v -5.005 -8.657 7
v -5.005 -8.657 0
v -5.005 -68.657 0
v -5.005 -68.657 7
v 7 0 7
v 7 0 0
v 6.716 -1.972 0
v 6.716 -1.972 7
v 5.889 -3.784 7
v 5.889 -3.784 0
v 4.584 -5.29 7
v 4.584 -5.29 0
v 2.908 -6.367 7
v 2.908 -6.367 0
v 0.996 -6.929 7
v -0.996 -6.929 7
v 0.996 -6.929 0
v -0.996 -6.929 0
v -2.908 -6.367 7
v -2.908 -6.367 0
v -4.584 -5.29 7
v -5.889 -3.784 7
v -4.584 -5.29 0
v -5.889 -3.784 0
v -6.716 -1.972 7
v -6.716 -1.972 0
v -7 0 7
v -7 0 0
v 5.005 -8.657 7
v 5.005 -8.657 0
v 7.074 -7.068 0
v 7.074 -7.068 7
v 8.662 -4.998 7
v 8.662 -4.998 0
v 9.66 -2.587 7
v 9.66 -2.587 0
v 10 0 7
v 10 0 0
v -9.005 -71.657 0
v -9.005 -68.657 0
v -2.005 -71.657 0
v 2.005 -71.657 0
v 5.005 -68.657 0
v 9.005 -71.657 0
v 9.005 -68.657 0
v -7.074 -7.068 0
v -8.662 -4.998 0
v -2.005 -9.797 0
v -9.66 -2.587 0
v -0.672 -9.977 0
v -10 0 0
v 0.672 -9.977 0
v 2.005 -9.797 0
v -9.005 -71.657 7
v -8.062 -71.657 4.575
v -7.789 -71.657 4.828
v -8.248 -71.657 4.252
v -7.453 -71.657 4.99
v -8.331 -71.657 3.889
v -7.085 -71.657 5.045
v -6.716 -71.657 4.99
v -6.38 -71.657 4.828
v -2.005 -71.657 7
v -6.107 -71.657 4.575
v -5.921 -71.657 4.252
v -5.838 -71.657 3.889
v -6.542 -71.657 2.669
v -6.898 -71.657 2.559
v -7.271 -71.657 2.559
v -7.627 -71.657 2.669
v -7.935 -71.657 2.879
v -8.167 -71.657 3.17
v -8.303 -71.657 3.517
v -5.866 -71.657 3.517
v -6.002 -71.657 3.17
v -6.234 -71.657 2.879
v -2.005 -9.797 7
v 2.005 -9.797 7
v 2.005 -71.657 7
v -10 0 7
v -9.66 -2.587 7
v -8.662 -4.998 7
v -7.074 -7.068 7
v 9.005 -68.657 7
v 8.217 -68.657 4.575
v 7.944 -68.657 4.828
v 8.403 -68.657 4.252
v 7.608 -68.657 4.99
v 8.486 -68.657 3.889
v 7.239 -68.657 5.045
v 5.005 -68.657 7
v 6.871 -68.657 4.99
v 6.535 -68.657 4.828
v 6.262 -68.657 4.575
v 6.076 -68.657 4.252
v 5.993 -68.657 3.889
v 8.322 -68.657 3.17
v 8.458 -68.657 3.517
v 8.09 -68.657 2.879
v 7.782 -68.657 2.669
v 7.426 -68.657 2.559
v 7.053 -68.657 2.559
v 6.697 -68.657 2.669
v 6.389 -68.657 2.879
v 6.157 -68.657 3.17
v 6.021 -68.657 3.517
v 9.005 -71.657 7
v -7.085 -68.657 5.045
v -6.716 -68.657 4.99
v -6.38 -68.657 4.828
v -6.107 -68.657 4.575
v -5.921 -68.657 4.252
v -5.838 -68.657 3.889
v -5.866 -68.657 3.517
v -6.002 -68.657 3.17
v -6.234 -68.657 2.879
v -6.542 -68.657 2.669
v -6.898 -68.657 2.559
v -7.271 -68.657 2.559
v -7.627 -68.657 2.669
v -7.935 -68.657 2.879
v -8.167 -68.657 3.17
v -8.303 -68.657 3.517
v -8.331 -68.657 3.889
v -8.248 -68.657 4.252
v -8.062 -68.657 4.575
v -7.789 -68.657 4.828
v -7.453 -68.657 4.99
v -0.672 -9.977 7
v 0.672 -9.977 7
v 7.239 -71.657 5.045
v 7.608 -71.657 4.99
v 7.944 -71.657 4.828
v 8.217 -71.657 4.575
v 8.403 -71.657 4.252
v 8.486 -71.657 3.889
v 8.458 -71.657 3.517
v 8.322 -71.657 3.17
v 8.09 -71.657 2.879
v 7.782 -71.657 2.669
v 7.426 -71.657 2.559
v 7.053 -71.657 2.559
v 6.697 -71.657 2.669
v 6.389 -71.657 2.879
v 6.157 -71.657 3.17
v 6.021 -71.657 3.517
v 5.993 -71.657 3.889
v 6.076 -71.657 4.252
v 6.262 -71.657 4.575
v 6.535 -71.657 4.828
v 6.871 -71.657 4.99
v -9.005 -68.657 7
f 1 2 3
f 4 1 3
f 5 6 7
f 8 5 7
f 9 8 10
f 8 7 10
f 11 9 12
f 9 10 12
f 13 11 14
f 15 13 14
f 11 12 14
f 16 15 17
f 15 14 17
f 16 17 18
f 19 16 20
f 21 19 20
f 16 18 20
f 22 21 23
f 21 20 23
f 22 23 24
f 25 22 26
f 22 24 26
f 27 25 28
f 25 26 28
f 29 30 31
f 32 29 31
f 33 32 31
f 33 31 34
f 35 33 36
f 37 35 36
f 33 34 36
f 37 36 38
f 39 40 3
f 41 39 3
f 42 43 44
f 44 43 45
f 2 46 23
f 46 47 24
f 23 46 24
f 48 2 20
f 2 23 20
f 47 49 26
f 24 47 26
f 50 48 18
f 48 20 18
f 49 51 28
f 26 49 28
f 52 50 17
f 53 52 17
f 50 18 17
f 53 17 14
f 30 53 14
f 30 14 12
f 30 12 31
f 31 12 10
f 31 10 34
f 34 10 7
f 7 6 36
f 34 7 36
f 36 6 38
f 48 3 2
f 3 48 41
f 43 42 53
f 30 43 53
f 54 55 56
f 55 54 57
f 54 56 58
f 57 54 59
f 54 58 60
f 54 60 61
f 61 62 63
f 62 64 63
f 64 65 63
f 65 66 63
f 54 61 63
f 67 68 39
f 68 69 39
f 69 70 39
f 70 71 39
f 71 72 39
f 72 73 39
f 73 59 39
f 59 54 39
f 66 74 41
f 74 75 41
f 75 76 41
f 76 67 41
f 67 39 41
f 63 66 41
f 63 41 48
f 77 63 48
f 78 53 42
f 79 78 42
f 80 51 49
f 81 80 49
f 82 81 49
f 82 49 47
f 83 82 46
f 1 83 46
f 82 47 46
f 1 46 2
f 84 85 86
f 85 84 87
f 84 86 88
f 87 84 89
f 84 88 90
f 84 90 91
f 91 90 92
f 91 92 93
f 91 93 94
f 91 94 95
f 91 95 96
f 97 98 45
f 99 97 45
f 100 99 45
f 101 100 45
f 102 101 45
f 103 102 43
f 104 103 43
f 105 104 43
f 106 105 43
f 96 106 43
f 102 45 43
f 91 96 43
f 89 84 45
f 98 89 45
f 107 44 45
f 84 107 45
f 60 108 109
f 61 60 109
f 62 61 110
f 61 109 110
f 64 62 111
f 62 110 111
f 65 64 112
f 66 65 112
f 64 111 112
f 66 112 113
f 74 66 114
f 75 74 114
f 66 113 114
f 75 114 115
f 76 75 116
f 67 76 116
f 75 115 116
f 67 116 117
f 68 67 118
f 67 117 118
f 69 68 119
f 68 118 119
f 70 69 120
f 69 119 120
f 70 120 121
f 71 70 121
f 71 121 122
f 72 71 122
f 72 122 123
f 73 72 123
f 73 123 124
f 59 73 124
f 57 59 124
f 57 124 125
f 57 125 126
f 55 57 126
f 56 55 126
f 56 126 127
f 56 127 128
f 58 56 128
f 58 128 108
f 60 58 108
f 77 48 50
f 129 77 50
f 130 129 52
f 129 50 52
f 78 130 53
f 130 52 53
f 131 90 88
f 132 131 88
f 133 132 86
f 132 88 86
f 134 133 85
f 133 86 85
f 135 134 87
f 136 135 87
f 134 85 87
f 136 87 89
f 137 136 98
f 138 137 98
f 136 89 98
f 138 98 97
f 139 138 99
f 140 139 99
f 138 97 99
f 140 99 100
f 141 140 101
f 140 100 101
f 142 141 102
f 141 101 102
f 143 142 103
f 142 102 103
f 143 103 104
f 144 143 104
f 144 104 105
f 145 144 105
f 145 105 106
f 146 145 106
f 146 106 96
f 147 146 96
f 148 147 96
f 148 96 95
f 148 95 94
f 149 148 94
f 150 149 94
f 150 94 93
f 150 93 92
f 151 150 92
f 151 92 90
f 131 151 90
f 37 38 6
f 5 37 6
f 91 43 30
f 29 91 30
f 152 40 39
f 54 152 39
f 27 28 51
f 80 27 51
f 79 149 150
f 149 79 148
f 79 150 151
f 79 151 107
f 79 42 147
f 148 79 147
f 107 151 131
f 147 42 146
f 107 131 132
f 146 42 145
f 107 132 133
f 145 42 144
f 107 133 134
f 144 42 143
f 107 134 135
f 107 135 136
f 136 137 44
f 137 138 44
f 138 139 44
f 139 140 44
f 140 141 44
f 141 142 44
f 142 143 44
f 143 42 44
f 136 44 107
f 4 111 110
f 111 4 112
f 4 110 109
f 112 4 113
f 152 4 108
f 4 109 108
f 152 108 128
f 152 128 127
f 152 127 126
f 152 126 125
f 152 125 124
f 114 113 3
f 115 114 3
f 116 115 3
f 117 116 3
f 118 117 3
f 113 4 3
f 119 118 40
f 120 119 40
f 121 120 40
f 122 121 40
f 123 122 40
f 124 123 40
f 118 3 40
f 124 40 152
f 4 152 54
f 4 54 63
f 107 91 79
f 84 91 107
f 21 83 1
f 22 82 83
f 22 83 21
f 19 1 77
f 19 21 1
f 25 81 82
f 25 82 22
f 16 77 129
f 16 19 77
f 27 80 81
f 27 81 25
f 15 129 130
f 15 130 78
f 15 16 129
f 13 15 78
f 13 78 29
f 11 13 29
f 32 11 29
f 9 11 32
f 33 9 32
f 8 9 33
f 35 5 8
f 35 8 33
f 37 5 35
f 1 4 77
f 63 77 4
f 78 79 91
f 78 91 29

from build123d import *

# Parameters (mm, degrees)
BOSS_EXTRUDE1_DEPTH = 7
SKETCH3_R           = 1.25
CUT_EXTRUDE1_DEPTH  = 10


with BuildPart() as part:
    # Sketch2 → Boss-Extrude1 (new body)
    with BuildSketch(Plane.XY):
        with BuildLine():
            Line((-5.004882759, -8.657433139), (-5.004882759, -68.657433139))
            Line((-5.004882759, -68.657433139), (-9.004882759, -68.657433139))
            Line((-9.004882759, -68.657433139), (-9.004882759, -71.657433139))
            Line((-9.004882759, -71.657433139), (-2.004882759, -71.657433139))
            Line((-2.004882759, -71.657433139), (-2.004882759, -9.796961015))
            ThreePointArc((-2.004882759, -9.796961015), (0, -10), (2.004882759, -9.796961015))
            Line((2.004882759, -9.796961015), (2.004882759, -71.657433139))
            Line((2.004882759, -71.657433139), (9.004882759, -71.657433139))
            Line((9.004882759, -71.657433139), (9.004882759, -68.657433139))
            Line((9.004882759, -68.657433139), (5.004882759, -68.657433139))
            Line((5.004882759, -68.657433139), (5.004882759, -8.657433139))
            ThreePointArc((5.004882759, -8.657433139), (8.661663454, -4.997558024), (10, 0))
            Line((10, 0), (7, 0))
            ThreePointArc((7, 0), (0, -7), (-7, 0))
            Line((-7, 0), (-10, 0))
            ThreePointArc((-10, 0), (-8.661663454, -4.997558024), (-5.004882759, -8.657433139))
        make_face()
    extrude(amount=BOSS_EXTRUDE1_DEPTH)

    # Sketch3 → Cut-Extrude1 (cut)
    with BuildSketch(Plane(origin=(0, -68.657433139, 0), x_dir=(1, 0, 0), z_dir=(0, 1, 0))):
        with Locations(Location((-7.084526396, -3.795336707, 0), (0, 0, 270))):
            Circle(SKETCH3_R)
        with Locations(Location((7.239366758, -3.795336707, 0), (0, 0, 270))):
            Circle(SKETCH3_R)
    extrude(amount=-CUT_EXTRUDE1_DEPTH, mode=Mode.SUBTRACT)


solid = part.part
